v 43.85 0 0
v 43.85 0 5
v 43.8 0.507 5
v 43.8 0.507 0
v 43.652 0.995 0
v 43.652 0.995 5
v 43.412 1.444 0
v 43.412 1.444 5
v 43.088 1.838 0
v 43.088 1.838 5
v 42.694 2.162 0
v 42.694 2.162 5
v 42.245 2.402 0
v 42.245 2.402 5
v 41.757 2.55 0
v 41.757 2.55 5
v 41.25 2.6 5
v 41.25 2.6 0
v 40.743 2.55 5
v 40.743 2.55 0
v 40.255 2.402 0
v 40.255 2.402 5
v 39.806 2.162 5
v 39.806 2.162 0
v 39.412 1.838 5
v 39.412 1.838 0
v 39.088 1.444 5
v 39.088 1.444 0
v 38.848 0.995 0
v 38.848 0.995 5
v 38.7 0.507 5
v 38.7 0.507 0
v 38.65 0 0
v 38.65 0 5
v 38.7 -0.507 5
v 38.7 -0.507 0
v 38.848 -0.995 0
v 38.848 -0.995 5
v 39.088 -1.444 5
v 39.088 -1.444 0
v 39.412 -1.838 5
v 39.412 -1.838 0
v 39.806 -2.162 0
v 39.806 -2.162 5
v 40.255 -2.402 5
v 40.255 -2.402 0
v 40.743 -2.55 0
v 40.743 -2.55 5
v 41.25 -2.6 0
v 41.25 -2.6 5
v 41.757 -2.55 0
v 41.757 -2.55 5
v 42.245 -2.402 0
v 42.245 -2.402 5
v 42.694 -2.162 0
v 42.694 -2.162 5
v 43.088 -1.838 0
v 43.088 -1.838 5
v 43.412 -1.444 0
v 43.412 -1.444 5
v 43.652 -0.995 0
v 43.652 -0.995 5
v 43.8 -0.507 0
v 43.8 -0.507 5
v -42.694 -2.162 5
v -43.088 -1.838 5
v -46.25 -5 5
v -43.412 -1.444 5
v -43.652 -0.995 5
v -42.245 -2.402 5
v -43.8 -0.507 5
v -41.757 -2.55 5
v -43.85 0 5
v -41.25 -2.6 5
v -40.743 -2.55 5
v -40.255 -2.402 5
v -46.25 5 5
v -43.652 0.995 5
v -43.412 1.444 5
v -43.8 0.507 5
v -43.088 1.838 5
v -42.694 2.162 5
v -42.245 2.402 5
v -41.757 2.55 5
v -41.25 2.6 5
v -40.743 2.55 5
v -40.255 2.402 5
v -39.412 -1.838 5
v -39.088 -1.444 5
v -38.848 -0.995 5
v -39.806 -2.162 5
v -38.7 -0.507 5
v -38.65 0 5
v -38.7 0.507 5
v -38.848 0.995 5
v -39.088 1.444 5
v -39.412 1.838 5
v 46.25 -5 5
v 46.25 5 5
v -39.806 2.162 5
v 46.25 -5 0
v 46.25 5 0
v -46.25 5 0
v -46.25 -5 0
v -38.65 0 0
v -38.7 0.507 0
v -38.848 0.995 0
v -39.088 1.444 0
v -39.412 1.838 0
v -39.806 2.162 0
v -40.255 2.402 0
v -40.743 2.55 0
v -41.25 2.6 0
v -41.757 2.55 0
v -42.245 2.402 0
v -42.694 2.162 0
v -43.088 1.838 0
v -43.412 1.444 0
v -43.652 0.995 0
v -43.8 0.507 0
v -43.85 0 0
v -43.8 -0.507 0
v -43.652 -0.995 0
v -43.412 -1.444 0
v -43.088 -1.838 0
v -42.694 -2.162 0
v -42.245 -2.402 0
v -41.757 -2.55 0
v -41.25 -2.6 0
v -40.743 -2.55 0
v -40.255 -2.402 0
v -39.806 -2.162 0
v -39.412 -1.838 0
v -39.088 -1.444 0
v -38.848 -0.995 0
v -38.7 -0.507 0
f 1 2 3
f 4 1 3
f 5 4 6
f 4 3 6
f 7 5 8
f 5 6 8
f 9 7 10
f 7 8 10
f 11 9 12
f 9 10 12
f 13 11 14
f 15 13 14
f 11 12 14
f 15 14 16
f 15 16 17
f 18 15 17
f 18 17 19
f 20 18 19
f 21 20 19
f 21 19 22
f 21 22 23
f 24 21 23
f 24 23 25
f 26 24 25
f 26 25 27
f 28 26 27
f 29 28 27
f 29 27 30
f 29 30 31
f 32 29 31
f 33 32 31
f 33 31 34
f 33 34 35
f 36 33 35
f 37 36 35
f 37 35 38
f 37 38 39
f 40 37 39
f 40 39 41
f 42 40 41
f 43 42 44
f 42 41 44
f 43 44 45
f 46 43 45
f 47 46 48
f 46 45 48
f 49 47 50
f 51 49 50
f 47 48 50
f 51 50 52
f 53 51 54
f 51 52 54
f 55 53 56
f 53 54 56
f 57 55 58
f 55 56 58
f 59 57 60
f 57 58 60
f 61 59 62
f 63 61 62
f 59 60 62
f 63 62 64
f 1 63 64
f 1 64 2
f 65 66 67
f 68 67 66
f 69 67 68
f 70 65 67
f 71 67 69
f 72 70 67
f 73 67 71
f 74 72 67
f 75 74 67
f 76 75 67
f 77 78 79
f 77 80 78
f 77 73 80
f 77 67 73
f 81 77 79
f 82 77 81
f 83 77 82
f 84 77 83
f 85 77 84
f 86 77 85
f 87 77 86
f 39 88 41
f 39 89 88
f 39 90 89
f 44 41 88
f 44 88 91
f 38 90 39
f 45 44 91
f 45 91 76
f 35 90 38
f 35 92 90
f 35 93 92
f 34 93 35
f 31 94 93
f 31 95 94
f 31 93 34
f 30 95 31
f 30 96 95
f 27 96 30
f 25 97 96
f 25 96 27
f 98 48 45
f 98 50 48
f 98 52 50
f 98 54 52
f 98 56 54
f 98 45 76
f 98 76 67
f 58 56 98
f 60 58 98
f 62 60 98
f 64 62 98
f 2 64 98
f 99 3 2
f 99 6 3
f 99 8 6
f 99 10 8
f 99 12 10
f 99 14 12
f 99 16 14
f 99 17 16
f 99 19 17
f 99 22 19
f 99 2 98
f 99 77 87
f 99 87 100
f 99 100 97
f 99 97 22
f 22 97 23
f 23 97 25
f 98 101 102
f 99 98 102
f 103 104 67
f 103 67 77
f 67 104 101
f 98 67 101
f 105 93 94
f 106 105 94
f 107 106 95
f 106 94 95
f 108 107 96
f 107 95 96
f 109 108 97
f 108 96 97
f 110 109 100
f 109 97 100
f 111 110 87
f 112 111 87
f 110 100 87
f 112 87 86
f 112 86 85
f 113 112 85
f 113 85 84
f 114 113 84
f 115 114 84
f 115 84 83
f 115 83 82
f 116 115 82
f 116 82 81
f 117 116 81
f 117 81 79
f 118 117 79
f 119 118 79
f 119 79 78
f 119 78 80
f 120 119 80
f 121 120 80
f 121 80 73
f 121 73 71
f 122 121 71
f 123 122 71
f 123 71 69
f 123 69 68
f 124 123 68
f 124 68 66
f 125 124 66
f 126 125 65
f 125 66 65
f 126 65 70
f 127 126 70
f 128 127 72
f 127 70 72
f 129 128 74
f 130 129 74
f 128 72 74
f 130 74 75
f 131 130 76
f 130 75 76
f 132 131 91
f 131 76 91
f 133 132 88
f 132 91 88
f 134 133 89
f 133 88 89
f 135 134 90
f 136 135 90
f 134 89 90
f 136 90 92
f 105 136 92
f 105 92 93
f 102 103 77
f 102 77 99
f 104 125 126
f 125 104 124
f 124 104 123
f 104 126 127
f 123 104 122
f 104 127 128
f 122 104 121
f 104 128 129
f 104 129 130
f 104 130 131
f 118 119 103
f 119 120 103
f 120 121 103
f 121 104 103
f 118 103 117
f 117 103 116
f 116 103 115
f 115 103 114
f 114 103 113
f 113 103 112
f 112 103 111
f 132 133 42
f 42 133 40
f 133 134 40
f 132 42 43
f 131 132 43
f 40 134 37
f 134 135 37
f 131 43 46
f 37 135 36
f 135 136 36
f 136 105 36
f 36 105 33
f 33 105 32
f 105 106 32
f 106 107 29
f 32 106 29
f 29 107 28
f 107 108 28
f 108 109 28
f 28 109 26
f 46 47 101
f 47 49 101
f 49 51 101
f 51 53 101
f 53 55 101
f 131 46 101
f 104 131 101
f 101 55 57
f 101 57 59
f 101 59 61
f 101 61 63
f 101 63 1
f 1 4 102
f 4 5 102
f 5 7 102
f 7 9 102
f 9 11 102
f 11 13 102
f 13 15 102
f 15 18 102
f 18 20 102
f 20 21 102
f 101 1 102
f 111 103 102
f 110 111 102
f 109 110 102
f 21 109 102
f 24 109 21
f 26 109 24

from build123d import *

# Parameters (mm, degrees)
F0_W     = 92.5
F0_H     = 10
F1_DEPTH = 5
F3_DEPTH = 25
F4_R     = 2.6
F5_DEPTH = 25


with BuildPart() as f1:
    # F0 (on Top) → F1 (new body)
    with BuildSketch(Plane.XY):
        Rectangle(F0_W, F0_H)
    extrude(amount=F1_DEPTH)

    # F2 (on face) → F3 (cut)
    with BuildSketch(Plane.XY.offset(5)):
        with BuildLine():
            ThreePointArc((-43.85, 0), (-41.25, -2.6), (-38.65, 0))
            ThreePointArc((-38.65, 0), (-41.25, 2.6), (-43.85, 0))
        make_face()
    extrude(amount=-F3_DEPTH, mode=Mode.SUBTRACT)

    # F4 (on face) → F5 (cut)
    with BuildSketch(Plane.XY.offset(5)):
        with Locations((41.25, 0)):
            Circle(F4_R)
    extrude(amount=-F5_DEPTH, mode=Mode.SUBTRACT)


solid = f1.part
